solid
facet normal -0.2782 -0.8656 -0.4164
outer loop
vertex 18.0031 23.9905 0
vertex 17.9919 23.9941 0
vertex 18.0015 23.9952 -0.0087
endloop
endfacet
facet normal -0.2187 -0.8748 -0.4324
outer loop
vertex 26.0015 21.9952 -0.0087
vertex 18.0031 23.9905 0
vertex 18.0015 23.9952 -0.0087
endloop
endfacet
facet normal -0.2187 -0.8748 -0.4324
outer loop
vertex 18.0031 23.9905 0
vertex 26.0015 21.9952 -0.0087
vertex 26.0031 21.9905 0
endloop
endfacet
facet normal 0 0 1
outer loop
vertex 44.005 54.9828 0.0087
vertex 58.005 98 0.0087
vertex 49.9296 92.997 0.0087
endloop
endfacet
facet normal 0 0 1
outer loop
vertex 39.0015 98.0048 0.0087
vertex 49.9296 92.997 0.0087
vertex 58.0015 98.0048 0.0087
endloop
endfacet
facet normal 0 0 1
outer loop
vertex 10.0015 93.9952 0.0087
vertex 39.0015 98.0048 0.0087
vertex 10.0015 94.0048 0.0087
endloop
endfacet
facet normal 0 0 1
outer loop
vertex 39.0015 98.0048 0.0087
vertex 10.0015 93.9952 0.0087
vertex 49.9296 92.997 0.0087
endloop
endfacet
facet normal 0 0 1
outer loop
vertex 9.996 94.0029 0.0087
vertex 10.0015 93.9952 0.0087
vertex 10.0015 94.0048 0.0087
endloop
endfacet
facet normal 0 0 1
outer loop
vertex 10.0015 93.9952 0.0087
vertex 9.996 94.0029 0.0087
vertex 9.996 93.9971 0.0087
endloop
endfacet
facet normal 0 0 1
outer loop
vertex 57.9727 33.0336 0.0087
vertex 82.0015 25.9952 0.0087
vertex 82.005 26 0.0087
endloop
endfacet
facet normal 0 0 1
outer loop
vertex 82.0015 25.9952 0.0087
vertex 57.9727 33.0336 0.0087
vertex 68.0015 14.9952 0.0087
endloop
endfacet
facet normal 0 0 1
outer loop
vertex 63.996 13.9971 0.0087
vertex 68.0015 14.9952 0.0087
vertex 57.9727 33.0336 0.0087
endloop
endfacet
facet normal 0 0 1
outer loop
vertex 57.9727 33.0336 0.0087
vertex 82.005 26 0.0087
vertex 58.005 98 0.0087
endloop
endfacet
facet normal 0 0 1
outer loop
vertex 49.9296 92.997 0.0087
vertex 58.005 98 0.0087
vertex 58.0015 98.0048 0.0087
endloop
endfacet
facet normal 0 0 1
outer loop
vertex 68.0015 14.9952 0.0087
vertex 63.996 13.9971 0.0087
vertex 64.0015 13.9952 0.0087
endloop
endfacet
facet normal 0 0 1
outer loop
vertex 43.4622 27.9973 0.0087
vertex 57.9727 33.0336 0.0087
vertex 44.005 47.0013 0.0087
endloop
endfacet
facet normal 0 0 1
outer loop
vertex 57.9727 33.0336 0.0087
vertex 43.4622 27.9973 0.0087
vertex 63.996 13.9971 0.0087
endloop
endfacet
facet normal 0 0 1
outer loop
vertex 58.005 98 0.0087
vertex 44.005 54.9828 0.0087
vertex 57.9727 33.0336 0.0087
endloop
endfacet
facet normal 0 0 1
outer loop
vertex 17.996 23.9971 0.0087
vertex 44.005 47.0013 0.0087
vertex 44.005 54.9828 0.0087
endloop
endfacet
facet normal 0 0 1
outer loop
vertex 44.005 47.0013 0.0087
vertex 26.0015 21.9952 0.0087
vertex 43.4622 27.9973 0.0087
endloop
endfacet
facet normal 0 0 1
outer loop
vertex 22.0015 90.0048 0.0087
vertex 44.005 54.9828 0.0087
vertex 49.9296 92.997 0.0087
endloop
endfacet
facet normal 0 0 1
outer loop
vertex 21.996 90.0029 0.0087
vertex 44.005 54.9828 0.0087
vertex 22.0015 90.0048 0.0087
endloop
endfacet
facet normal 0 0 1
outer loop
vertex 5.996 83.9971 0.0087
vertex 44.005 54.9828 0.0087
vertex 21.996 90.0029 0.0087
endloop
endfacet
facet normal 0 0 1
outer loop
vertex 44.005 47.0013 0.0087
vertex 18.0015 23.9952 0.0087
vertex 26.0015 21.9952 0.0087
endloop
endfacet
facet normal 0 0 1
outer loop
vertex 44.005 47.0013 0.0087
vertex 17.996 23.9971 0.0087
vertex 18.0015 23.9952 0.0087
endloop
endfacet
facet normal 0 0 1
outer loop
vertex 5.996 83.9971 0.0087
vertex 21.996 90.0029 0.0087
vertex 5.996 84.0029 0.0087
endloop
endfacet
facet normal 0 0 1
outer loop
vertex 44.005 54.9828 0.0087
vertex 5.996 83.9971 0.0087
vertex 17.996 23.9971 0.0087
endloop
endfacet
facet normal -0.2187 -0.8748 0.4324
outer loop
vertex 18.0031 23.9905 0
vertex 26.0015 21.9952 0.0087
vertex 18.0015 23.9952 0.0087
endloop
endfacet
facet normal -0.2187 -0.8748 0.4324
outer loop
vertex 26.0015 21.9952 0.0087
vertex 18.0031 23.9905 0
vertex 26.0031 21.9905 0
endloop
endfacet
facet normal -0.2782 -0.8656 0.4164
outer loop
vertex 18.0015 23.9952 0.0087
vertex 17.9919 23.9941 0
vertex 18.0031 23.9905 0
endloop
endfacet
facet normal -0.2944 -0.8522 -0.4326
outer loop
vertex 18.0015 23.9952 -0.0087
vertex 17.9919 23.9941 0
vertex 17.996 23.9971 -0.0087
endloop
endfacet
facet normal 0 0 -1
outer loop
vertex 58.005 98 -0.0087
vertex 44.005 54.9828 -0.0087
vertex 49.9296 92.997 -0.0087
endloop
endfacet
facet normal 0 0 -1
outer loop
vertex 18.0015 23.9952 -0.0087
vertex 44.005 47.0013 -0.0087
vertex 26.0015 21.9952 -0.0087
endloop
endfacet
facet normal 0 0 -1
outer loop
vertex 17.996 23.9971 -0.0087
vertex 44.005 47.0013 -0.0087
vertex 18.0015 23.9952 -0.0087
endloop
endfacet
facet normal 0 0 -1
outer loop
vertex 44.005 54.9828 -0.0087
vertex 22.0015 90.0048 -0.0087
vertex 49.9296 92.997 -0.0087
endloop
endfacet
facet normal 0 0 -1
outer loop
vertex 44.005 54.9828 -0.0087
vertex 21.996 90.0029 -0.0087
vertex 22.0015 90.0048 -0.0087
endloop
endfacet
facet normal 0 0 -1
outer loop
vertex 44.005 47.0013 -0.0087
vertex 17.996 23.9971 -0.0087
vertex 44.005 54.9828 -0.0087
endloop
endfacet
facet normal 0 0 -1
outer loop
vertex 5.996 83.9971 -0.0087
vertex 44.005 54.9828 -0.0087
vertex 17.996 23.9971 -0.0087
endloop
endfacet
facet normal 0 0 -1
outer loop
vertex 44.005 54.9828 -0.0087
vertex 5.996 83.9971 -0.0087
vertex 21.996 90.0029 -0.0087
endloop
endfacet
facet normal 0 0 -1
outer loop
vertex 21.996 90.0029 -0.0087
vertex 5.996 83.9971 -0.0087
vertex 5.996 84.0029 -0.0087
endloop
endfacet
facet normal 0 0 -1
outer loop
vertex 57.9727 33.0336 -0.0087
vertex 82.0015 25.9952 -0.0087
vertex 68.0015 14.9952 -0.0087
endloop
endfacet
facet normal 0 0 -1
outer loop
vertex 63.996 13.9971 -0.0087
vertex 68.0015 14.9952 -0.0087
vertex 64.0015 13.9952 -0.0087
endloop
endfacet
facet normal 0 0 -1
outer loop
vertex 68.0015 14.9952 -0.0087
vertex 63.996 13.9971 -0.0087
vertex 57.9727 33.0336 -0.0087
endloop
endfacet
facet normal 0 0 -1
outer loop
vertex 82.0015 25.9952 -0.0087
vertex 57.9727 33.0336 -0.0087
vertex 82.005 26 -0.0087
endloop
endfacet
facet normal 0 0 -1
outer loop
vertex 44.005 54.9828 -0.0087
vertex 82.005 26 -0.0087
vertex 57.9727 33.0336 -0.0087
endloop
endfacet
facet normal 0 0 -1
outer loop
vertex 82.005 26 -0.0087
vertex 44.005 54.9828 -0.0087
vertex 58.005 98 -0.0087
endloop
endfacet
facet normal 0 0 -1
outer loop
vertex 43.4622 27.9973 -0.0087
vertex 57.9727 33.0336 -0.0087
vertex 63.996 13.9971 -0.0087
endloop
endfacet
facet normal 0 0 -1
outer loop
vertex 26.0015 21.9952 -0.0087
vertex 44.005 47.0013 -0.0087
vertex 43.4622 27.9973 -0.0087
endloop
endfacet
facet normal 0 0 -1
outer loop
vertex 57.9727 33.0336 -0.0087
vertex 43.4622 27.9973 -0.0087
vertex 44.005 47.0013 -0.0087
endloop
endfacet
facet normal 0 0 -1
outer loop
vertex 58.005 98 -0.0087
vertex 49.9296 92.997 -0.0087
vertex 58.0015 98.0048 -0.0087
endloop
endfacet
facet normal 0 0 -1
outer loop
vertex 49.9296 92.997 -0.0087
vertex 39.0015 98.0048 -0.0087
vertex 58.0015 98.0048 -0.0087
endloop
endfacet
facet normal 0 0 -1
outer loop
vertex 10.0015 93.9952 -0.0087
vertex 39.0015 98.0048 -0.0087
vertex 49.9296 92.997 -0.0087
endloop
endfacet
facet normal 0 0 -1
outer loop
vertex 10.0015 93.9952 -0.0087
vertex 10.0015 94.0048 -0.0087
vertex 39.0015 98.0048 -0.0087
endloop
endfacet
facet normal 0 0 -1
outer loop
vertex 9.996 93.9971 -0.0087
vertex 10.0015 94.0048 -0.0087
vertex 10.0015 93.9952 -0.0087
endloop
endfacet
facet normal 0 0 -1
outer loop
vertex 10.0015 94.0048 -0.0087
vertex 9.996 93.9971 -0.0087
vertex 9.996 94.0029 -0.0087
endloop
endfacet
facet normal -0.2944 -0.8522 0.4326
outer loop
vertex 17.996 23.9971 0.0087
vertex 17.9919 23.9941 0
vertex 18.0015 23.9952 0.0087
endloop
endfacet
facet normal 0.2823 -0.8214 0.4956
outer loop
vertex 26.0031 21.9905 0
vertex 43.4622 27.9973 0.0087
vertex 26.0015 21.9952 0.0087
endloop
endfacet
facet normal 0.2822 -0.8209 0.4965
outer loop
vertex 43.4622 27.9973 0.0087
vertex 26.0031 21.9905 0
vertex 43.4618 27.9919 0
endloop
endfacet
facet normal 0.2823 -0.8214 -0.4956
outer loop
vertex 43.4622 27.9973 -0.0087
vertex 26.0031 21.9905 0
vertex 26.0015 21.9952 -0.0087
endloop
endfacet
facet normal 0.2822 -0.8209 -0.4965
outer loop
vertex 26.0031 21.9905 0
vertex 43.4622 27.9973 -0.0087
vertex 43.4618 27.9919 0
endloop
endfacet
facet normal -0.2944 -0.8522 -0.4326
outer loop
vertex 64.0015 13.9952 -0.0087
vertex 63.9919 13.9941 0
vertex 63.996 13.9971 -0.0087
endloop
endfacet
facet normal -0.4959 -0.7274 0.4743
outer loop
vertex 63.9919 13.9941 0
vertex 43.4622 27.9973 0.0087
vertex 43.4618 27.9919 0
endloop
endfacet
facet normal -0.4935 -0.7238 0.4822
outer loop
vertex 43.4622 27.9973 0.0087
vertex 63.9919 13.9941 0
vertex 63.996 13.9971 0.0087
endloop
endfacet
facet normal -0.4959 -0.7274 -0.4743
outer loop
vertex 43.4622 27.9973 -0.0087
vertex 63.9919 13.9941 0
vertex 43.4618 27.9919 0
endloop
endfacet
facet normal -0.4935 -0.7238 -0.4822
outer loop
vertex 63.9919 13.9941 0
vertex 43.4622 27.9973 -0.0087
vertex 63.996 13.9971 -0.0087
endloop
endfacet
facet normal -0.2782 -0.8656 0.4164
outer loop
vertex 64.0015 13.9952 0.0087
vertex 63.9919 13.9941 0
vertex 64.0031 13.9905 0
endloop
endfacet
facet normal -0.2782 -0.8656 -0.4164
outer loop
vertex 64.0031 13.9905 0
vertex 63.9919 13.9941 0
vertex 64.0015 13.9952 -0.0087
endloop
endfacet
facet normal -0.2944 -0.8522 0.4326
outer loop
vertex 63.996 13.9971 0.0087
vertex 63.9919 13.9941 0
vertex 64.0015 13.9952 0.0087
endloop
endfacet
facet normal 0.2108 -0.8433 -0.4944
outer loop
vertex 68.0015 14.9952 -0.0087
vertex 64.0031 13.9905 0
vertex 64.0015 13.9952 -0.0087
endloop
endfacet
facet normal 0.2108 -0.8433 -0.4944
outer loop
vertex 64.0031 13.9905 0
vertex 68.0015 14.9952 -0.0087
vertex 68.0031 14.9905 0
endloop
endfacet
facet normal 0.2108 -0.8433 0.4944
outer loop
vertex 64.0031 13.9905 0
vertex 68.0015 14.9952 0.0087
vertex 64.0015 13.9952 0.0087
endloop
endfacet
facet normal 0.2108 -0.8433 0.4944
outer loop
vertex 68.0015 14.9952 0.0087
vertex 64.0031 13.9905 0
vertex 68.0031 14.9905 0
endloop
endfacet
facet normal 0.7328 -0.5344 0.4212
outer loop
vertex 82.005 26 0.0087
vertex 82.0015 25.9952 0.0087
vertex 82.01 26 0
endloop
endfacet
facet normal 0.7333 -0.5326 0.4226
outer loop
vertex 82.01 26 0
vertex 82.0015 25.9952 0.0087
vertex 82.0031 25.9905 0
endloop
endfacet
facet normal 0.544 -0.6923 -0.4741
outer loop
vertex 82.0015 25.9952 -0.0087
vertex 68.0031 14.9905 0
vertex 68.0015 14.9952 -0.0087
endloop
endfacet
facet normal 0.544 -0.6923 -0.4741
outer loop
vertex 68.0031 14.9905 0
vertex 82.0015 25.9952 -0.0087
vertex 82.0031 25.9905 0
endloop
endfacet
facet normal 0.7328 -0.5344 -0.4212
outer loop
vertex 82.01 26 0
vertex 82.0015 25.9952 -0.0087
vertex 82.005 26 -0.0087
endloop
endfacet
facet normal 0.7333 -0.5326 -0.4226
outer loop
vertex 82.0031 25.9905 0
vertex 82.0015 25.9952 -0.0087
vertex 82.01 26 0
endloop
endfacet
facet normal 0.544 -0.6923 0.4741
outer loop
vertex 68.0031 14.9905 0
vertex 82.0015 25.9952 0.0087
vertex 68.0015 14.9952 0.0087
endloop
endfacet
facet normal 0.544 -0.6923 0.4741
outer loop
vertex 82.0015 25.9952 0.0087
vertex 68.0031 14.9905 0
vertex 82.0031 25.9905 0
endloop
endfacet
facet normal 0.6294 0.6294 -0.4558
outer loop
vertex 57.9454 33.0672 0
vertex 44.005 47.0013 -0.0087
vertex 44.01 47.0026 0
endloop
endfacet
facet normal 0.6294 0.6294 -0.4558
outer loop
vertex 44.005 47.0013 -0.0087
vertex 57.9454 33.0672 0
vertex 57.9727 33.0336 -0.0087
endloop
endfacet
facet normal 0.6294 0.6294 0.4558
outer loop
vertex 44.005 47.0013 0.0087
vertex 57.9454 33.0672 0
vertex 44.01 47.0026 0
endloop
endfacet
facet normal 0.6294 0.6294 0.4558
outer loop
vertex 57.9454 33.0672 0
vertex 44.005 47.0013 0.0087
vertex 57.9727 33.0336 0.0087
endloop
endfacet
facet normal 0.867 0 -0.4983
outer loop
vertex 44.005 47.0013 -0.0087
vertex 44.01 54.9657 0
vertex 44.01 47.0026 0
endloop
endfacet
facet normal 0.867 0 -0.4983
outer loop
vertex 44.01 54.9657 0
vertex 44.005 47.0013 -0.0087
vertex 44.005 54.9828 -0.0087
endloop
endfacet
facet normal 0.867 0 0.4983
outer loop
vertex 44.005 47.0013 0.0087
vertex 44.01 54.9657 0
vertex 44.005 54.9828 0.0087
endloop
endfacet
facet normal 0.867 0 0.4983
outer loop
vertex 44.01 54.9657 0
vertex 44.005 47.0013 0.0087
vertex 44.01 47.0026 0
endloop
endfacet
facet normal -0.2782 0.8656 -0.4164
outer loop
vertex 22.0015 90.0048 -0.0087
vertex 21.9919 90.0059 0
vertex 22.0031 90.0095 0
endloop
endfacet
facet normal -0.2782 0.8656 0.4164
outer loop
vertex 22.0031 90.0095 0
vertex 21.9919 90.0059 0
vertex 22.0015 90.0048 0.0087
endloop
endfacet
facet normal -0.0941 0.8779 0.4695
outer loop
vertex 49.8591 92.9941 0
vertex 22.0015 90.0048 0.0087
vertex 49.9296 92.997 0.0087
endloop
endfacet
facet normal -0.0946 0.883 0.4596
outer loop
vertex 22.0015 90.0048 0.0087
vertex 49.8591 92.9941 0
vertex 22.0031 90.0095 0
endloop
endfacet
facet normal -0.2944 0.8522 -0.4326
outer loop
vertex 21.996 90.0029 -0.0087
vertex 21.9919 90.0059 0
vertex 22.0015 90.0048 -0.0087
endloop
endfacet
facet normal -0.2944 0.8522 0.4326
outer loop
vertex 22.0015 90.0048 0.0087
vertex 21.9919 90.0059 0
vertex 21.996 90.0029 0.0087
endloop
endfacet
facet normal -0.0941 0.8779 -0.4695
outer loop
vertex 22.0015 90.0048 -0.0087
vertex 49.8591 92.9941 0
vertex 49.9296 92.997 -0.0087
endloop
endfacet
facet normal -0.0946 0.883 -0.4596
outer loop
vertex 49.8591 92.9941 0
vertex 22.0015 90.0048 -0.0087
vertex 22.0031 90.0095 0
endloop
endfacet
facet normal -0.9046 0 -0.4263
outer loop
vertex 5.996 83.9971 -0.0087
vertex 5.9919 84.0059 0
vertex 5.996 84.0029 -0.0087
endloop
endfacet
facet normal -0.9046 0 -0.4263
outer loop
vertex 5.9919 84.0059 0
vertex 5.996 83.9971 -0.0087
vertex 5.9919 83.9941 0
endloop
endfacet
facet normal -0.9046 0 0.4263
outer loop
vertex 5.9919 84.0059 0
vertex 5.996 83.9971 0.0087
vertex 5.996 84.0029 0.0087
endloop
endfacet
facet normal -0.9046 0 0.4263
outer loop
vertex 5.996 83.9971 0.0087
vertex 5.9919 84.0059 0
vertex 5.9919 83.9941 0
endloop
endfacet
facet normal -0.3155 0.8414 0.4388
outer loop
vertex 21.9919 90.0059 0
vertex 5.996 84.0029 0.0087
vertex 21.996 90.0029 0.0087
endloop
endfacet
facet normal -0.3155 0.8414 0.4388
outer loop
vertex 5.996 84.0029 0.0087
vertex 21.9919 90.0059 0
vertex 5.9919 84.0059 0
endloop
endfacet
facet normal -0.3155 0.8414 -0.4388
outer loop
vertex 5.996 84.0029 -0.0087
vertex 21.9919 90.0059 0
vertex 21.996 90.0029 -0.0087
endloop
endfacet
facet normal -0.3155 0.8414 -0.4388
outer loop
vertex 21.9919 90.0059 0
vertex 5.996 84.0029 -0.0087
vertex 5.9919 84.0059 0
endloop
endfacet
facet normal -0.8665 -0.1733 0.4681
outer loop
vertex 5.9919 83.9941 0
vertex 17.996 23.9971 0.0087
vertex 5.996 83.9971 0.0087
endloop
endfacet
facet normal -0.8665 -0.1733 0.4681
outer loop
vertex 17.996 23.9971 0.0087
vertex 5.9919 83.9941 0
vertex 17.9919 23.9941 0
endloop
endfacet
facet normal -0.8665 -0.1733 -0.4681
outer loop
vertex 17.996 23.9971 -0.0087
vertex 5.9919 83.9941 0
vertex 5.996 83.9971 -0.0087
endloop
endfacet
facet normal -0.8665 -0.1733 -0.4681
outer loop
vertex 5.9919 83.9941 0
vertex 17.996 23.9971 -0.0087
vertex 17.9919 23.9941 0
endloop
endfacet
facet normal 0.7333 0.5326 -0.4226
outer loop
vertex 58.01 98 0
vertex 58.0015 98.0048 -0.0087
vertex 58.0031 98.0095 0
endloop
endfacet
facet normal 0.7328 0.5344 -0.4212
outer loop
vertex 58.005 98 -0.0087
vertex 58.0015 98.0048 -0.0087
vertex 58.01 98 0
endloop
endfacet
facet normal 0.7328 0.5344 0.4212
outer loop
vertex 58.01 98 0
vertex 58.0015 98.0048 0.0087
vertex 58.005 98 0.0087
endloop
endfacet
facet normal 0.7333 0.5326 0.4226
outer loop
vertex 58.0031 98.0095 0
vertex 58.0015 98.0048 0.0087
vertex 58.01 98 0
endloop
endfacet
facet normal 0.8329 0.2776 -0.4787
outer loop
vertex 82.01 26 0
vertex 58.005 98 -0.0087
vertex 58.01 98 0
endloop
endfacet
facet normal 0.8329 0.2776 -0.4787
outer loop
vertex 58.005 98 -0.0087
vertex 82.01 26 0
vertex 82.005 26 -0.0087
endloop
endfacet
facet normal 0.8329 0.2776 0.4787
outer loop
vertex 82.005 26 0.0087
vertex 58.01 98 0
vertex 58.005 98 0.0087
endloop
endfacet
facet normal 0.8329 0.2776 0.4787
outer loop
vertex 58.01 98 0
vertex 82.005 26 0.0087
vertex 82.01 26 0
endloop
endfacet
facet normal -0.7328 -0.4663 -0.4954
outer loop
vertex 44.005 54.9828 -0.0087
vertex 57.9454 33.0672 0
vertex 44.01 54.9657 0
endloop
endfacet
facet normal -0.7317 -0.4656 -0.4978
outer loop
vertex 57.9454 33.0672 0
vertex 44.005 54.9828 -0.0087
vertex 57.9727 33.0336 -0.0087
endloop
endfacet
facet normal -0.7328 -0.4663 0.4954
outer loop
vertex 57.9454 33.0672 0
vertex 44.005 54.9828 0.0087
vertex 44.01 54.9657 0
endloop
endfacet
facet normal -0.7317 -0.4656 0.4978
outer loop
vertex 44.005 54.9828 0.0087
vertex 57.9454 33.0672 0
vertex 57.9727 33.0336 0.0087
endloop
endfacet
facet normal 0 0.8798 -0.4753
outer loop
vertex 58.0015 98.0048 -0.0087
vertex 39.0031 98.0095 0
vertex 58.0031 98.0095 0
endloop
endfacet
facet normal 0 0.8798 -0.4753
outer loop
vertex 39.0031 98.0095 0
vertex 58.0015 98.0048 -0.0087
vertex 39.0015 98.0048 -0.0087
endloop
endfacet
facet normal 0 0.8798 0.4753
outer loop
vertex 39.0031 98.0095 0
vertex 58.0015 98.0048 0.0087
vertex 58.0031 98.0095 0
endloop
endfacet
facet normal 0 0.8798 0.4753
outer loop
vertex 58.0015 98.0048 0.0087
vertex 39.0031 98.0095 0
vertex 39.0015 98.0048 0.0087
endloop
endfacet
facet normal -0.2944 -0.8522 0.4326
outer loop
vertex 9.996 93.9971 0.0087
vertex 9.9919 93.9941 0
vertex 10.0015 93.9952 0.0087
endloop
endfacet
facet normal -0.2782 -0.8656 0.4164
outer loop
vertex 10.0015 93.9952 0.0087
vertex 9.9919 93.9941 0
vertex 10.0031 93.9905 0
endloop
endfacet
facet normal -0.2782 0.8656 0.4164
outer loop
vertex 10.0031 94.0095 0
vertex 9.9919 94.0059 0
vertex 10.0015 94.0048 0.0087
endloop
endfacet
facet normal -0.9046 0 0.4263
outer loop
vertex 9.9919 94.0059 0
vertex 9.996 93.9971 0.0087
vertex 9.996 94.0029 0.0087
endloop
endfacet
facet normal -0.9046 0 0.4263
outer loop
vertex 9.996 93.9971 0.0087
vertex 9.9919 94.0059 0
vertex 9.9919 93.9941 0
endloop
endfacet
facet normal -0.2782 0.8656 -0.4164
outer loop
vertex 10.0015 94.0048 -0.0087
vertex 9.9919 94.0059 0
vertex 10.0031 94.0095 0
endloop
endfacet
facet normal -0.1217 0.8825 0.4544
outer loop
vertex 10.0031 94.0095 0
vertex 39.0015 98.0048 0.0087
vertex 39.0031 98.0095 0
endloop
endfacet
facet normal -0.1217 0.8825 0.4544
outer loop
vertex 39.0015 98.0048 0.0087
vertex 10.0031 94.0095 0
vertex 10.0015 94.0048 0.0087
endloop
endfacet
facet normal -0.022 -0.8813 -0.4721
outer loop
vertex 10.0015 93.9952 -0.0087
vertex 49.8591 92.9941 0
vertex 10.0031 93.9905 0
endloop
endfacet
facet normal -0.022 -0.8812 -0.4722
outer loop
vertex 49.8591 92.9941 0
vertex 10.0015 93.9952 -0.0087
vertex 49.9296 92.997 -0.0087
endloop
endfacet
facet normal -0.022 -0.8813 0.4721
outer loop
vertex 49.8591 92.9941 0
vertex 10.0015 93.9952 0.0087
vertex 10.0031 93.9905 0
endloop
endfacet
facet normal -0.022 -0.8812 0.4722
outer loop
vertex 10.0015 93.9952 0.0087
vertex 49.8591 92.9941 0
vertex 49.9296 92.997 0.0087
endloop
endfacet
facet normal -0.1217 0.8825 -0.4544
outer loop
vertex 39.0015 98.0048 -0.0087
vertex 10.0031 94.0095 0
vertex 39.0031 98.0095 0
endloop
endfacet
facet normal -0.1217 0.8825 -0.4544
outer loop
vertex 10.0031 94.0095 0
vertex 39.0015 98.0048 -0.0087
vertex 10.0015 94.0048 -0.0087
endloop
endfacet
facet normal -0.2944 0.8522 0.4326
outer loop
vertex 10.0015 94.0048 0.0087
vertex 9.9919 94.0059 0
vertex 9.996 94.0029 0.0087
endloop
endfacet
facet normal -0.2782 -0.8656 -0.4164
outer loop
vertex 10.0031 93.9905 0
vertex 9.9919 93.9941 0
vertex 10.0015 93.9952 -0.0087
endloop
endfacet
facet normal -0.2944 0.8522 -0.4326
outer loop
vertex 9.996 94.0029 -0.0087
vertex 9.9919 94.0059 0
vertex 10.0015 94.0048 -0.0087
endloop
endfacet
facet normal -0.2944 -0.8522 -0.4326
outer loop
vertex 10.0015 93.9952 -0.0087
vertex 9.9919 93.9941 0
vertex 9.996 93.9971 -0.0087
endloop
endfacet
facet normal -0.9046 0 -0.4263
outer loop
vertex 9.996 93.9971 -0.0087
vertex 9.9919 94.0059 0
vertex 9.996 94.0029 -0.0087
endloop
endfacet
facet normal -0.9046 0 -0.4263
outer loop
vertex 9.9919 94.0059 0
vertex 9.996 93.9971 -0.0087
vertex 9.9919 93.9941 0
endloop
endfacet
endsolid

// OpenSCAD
color([0.3519350680925015,0.6477014615427978,0.14125726454845833]) hull(){
    translate([18,24]) sphere(0.01);
    translate([26,22]) sphere(0.01);
    translate([42,29]) sphere(0.01);
}
color([0.23013900541024712,0.8285218163248013,0.9603761550286747]) hull(){
    translate([26,22]) sphere(0.01);
    translate([42,29]) sphere(0.01);
    translate([58,33]) sphere(0.01);
}
color([0.6050710034948523,0.017553655236826726,0.43262871278032167]) hull(){
    translate([42,29]) sphere(0.01);
    translate([58,33]) sphere(0.01);
    translate([64,14]) sphere(0.01);
}
color([0.2571490251669072,0.4480229944680496,0.14517873337393172]) hull(){
    translate([58,33]) sphere(0.01);
    translate([64,14]) sphere(0.01);
    translate([68,15]) sphere(0.01);
}
color([0.8405131005933094,0.9776834869331054,0.10300019528175153]) hull(){
    translate([58,33]) sphere(0.01);
    translate([68,15]) sphere(0.01);
    translate([82,26]) sphere(0.01);
}
color([0.998153073210626,0.8535026464000083,0.6855970549077809]) hull(){
    translate([42,29]) sphere(0.01);
    translate([44,47]) sphere(0.01);
    translate([58,33]) sphere(0.01);
}
color([0.7995005100691247,0.34047238184459006,0.1286635278612125]) hull(){
    translate([42,29]) sphere(0.01);
    translate([44,47]) sphere(0.01);
    translate([44,55]) sphere(0.01);
}
color([0.6020598448119898,0.9167847797194366,0.02081986636819022]) hull(){
    translate([42,29]) sphere(0.01);
    translate([44,55]) sphere(0.01);
    translate([18,58]) sphere(0.01);
}
color([0.9135118305629362,0.3823609034395232,0.42581309278619206]) hull(){
    translate([18,58]) sphere(0.01);
    translate([44,55]) sphere(0.01);
    translate([50,93]) sphere(0.01);
}
color([0.08967296065919184,0.0016857337534631478,0.31287848776698257]) hull(){
    translate([18,58]) sphere(0.01);
    translate([50,93]) sphere(0.01);
    translate([22,90]) sphere(0.01);
}
color([0.09731792302828757,0.364404074066101,0.8754307508322564]) hull(){
    translate([18,58]) sphere(0.01);
    translate([22,90]) sphere(0.01);
    translate([6,84]) sphere(0.01);
}
color([0.6967090939923642,0.5776053806129825,0.18685318159950626]) hull(){
    translate([18,58]) sphere(0.01);
    translate([6,84]) sphere(0.01);
    translate([18,24]) sphere(0.01);
}
color([0.9585806736472646,0.593334846568766,0.09927504601217696]) hull(){
    translate([44,55]) sphere(0.01);
    translate([50,93]) sphere(0.01);
    translate([58,98]) sphere(0.01);
}
color([0.19313665173925,0.6863688301261038,0.2093263356404984]) hull(){
    translate([44,55]) sphere(0.01);
    translate([58,98]) sphere(0.01);
    translate([82,26]) sphere(0.01);
}
color([0.2694340379225941,0.24598969558588324,0.16092298384524362]) hull(){
    translate([82,26]) sphere(0.01);
    translate([44,55]) sphere(0.01);
    translate([58,33]) sphere(0.01);
}
color([0.5102606956149307,0.431705445139412,0.38909399282504675]) hull(){
    translate([58,98]) sphere(0.01);
    translate([50,93]) sphere(0.01);
    translate([39,98]) sphere(0.01);
}
color([0.3194819673674283,0.6655357355223767,0.22692357675811492]) hull(){
    translate([39,98]) sphere(0.01);
    translate([50,93]) sphere(0.01);
    translate([10,94]) sphere(0.01);
}
color([0.9464906820257937,0.35776616524050997,0.9421064453260054]) hull(){
    translate([58,98]) sphere(0.01);
    translate([39,98]) sphere(0.01);
    translate([10,94]) sphere(0.01);
}
color([0.3792404853118415,0.27508202782836655,0.9368074710650367]) hull(){
    translate([18,58]) sphere(0.01);
    translate([42,29]) sphere(0.01);
    translate([18,24]) sphere(0.01);
}
color([0.7670397757471089,0.17483880300164423,0.7474114244696689]) hull(){
    translate([58,98]) sphere(0.01);
    translate([58,33]) sphere(0.01);
    translate([82,26]) sphere(0.01);
}
color([0.6015236368594579,0.5872808850844162,0.28390336255679416]) hull(){
    translate([50,93]) sphere(0.01);
    translate([58,98]) sphere(0.01);
    translate([10,94]) sphere(0.01);
}
